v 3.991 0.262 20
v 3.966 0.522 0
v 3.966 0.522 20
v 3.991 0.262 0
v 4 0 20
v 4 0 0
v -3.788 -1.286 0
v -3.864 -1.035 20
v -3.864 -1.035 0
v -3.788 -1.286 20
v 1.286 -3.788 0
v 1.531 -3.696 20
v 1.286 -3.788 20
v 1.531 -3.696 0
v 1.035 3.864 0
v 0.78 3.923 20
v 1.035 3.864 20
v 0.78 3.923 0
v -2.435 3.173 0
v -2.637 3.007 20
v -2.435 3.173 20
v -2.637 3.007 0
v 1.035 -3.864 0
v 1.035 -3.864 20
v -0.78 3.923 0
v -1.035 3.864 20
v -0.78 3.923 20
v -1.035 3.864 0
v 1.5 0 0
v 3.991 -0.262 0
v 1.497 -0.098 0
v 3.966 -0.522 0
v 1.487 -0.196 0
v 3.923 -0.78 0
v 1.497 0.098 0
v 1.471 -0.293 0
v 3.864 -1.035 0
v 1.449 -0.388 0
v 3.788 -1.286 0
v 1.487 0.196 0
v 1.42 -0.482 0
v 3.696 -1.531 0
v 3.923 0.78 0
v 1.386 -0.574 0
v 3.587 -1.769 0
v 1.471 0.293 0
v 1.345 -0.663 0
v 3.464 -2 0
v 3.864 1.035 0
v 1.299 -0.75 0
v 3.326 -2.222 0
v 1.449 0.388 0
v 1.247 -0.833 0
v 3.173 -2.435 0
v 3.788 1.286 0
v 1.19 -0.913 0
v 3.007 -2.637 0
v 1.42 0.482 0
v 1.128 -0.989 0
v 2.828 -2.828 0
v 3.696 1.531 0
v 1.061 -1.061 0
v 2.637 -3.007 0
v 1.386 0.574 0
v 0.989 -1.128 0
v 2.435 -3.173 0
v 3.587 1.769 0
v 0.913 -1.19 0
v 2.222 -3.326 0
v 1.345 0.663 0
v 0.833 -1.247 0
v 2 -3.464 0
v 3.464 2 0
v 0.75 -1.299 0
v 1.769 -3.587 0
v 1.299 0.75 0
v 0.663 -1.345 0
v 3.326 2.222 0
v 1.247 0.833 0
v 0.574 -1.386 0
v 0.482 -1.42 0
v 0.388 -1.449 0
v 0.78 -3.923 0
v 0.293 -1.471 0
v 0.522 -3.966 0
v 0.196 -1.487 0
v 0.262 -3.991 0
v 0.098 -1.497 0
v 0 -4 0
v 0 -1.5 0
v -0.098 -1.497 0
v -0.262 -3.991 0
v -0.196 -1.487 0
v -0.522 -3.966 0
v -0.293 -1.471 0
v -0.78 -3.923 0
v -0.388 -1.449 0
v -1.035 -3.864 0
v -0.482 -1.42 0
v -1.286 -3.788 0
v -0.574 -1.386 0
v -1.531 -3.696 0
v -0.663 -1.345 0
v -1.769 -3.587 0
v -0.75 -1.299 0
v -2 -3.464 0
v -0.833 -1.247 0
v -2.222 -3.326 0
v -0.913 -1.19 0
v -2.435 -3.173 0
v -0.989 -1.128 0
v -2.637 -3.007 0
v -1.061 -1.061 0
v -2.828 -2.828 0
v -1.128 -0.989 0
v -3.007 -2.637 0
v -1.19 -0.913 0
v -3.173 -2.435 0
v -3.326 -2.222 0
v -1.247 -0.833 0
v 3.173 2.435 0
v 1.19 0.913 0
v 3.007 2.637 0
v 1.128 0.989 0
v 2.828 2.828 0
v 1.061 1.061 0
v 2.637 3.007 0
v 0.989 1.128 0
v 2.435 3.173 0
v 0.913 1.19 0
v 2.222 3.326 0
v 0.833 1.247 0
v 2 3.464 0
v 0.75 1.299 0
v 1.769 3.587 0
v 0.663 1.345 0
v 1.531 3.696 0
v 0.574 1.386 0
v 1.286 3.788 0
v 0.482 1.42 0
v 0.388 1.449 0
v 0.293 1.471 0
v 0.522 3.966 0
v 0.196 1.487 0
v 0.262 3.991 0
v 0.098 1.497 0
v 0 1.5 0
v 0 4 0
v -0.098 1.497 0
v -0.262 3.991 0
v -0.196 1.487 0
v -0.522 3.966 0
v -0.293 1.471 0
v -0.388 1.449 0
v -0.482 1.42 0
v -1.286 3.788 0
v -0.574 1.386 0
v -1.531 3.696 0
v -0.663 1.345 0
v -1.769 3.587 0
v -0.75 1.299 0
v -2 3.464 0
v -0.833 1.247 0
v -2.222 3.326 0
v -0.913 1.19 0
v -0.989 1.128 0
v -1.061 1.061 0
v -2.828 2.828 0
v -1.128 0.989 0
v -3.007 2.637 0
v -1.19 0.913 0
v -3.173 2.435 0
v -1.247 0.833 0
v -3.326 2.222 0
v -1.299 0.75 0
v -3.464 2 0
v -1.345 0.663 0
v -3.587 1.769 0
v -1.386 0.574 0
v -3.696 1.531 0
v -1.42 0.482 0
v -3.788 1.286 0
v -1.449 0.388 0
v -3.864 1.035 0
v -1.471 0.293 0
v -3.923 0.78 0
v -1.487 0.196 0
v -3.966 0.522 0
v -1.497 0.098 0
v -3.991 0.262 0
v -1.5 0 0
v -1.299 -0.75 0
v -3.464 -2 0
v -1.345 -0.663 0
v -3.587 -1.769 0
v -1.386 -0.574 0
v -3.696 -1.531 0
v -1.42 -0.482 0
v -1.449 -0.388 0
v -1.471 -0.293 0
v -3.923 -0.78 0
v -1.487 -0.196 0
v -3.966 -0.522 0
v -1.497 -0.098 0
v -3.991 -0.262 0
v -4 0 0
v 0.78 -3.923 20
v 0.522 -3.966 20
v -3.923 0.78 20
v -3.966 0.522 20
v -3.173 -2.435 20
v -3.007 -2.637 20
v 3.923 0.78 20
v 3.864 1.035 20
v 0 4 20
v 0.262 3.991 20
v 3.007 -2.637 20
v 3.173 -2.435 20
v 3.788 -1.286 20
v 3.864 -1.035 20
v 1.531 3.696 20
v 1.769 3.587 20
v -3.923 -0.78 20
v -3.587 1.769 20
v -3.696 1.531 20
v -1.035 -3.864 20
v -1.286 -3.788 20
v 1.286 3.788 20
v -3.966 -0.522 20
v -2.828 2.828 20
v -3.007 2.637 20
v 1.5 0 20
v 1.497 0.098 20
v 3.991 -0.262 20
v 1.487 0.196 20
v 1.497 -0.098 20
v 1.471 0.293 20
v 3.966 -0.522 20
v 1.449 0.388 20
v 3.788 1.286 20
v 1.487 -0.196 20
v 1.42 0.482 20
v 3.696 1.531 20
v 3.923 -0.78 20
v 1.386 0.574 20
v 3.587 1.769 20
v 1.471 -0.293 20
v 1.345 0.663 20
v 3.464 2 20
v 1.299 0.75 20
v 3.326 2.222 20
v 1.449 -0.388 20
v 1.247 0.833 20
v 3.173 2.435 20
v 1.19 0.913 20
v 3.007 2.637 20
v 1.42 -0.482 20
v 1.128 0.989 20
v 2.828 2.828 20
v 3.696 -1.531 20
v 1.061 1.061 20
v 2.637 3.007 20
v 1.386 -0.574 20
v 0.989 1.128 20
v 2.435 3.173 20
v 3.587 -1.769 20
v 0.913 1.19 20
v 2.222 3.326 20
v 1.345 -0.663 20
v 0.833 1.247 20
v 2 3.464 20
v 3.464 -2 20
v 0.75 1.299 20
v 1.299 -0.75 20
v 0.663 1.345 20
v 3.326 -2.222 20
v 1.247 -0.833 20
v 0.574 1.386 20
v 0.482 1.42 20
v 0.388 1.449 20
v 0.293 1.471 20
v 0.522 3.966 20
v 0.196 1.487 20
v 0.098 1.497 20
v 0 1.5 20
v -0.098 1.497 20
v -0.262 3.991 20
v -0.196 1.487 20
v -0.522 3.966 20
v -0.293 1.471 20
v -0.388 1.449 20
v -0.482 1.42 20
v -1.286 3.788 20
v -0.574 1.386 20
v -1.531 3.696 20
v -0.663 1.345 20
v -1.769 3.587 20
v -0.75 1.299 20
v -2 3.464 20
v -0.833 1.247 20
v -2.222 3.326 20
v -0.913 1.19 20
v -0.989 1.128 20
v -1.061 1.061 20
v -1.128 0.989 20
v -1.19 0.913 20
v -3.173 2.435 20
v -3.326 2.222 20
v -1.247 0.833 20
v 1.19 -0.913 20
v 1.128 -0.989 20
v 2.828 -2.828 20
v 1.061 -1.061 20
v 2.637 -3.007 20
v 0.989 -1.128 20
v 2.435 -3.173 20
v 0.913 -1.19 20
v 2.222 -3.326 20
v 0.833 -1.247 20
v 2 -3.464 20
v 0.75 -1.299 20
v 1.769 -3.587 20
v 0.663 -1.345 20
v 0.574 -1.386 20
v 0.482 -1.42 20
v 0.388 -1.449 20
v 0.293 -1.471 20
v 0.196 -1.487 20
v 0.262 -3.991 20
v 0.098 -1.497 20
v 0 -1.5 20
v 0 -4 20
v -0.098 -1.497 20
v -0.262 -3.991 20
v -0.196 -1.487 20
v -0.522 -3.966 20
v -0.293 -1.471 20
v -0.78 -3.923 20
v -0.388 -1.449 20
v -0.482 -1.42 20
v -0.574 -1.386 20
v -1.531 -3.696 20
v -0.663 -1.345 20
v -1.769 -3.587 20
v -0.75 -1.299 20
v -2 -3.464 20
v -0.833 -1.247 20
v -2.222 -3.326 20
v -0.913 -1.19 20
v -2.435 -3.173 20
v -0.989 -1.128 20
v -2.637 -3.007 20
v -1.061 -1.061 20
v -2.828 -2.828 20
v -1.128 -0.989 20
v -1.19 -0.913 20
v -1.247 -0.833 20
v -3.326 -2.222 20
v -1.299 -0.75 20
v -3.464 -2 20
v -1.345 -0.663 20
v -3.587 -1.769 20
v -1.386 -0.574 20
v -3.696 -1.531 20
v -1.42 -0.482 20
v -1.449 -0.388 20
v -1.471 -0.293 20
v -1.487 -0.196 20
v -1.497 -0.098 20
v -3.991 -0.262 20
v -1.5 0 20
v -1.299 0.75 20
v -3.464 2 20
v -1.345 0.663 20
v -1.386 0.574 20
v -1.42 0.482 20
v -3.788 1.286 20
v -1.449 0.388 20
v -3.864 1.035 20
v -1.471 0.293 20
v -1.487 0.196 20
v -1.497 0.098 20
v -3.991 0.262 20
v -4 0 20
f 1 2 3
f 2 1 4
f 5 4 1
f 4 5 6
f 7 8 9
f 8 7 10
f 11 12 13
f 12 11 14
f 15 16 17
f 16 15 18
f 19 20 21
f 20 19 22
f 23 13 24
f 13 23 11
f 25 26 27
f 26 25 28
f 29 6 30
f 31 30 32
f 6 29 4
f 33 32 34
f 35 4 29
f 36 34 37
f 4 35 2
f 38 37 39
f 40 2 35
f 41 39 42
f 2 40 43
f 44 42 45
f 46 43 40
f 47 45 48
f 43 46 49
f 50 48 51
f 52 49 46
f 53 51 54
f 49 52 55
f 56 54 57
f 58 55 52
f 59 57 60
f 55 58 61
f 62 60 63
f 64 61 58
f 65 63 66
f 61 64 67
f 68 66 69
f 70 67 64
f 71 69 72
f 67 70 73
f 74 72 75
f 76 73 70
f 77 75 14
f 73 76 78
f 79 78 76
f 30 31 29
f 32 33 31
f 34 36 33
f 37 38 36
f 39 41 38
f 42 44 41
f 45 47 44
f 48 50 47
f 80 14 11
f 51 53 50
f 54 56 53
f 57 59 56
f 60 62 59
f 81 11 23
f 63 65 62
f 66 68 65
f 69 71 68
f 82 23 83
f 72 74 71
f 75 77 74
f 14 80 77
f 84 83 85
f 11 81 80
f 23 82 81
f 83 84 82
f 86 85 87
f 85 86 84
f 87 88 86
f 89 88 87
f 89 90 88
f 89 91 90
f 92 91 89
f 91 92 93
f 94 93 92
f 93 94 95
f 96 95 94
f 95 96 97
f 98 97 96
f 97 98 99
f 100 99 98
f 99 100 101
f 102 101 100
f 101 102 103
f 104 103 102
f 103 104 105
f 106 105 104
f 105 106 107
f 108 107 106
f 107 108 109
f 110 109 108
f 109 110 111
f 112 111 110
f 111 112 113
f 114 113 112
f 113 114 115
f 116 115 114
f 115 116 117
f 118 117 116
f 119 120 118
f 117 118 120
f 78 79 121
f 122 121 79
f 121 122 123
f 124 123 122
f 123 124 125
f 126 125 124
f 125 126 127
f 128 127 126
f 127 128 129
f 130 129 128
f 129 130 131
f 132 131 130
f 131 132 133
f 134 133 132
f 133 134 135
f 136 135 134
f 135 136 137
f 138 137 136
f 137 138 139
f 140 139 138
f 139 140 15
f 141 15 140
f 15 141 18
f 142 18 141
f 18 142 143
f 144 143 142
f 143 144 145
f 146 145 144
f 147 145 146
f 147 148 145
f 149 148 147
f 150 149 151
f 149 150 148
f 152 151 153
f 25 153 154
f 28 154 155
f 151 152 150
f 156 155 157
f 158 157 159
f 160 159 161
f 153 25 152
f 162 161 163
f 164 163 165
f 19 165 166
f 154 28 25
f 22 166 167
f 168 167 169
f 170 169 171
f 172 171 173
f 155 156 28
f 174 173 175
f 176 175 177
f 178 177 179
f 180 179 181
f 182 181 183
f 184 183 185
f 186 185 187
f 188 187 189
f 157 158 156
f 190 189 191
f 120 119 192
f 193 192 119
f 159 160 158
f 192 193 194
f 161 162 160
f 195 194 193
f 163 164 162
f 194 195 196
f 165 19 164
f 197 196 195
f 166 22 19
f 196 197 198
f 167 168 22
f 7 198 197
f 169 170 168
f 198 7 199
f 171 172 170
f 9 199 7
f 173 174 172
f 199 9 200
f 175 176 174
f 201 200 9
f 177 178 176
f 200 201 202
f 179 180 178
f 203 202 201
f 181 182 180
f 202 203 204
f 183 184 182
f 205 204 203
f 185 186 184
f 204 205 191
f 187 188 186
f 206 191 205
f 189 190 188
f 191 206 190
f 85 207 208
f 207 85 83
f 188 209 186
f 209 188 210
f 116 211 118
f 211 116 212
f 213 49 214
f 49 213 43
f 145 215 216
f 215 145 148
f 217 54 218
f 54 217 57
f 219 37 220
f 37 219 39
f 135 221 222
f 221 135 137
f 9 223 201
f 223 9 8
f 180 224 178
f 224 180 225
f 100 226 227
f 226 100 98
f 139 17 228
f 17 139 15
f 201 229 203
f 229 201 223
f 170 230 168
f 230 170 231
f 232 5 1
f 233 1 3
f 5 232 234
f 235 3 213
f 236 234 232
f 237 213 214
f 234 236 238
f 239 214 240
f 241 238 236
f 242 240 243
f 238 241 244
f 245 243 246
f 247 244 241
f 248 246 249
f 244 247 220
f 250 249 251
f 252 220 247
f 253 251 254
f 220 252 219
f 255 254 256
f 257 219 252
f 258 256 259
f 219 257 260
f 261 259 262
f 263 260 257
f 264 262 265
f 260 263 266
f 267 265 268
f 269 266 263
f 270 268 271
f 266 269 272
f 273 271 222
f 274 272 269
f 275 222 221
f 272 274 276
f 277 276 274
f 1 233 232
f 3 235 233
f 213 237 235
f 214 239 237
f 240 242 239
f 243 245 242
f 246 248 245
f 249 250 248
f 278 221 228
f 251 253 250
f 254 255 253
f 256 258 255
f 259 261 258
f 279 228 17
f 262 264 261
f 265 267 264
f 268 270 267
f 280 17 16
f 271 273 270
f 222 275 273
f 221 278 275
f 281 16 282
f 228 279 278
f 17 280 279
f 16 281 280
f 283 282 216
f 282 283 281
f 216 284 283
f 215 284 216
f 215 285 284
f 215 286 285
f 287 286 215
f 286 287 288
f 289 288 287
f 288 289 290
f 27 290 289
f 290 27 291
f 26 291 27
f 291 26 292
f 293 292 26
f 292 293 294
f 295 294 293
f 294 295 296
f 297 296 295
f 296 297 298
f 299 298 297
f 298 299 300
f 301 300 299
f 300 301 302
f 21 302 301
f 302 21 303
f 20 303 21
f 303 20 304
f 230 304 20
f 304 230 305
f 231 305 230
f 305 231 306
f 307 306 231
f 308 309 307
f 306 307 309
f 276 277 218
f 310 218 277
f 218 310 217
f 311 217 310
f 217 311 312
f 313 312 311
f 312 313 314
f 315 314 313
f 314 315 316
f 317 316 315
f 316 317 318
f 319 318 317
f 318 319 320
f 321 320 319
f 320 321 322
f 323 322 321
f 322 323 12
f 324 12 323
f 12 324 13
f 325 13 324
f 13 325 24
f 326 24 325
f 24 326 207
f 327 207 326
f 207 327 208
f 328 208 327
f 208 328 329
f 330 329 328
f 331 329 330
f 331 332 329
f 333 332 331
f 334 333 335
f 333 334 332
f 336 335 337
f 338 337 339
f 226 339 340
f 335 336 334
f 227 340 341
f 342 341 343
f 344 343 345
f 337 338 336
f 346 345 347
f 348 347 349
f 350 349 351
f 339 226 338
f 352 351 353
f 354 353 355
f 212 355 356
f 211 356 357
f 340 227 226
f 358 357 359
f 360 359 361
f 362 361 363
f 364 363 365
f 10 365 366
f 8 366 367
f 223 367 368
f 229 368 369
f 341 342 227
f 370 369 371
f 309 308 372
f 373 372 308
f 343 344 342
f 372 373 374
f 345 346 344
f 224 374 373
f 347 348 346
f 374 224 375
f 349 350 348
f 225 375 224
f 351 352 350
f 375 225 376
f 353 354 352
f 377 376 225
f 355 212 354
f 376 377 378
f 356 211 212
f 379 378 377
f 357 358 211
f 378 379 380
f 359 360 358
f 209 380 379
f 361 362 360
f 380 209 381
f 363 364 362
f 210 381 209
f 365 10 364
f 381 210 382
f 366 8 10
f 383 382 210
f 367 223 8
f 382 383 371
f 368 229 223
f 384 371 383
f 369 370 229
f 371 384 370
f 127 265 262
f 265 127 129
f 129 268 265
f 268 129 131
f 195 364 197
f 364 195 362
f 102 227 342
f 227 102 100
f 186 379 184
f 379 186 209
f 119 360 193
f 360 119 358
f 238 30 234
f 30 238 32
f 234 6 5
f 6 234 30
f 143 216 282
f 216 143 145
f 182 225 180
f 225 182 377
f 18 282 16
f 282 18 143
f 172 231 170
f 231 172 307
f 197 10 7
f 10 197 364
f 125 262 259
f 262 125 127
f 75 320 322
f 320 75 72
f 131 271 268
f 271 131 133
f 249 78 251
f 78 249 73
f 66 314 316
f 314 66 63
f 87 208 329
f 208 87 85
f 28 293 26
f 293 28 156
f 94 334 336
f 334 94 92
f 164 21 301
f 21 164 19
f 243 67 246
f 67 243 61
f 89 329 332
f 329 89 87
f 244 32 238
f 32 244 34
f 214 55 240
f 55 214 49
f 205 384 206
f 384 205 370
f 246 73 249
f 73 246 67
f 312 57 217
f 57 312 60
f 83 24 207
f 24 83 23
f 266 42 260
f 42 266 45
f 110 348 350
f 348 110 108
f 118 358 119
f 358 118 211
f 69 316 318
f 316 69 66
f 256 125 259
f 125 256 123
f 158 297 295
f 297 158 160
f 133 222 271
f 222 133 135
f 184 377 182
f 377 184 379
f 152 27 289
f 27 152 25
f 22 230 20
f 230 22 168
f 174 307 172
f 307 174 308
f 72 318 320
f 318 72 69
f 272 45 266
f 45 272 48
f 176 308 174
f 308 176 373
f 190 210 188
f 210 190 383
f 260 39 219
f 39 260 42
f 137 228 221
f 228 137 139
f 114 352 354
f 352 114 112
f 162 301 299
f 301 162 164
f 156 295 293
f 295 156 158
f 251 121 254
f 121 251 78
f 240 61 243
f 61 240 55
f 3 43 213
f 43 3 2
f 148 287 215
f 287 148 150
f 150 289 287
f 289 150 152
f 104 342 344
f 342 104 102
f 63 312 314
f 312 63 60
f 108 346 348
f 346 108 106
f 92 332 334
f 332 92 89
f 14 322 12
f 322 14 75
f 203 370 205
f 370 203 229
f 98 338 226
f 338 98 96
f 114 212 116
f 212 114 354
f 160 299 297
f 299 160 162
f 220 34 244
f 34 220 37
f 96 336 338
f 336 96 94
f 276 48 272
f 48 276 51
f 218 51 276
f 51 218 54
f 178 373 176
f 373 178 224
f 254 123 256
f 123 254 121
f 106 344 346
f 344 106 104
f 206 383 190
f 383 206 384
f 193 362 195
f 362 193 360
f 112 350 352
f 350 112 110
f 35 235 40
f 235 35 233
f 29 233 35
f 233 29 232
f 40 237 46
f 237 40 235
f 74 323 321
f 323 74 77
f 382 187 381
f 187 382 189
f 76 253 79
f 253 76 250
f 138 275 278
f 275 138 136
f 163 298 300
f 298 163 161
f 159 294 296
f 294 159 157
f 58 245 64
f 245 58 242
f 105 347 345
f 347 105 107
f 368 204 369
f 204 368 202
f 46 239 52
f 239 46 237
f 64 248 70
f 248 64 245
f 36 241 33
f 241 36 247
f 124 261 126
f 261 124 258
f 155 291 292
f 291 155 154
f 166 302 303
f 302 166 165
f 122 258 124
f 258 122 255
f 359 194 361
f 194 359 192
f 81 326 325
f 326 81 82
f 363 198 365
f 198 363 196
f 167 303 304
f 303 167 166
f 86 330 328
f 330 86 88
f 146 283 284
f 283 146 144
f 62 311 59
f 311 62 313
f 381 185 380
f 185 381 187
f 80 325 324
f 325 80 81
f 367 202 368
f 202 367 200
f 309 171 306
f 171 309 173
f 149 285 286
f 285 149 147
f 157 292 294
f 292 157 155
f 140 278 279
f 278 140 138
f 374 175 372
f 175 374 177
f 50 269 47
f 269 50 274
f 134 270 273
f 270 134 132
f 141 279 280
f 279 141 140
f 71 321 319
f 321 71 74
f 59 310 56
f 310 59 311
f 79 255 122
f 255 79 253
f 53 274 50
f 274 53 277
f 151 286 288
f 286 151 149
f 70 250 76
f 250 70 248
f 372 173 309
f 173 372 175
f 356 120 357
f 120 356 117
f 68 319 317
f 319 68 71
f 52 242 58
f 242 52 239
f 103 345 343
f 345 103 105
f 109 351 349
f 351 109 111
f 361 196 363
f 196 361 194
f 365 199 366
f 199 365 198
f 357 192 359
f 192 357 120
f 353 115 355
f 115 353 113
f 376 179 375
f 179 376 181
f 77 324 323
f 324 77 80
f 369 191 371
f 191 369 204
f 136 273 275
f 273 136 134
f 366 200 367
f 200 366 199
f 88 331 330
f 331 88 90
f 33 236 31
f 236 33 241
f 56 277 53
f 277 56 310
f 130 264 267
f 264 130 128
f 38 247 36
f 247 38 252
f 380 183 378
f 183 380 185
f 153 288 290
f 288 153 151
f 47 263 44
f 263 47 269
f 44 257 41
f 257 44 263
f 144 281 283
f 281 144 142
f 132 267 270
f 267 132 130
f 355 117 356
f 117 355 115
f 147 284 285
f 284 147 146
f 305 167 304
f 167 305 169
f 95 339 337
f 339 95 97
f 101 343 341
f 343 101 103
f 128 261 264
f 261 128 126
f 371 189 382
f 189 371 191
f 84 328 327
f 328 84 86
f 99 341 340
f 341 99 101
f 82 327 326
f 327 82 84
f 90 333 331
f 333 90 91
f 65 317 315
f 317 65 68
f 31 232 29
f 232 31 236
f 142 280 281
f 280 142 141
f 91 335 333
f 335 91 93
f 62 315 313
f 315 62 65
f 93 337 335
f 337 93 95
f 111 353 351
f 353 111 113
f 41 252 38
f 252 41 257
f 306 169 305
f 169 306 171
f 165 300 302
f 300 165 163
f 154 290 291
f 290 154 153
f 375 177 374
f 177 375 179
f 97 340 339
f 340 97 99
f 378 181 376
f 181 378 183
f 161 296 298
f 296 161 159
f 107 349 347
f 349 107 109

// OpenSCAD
$fn = 96;

thread_d = 3.0;      // nominal thread diameter (mm)
length = 20.0;       // overall length (mm)
outer_d = 8.0;       // standoff outer diameter (mm)

difference() {
    cylinder(d = outer_d, h = length);
    translate([0, 0, -0.2])
        cylinder(d = thread_d, h = length + 0.4);
}
